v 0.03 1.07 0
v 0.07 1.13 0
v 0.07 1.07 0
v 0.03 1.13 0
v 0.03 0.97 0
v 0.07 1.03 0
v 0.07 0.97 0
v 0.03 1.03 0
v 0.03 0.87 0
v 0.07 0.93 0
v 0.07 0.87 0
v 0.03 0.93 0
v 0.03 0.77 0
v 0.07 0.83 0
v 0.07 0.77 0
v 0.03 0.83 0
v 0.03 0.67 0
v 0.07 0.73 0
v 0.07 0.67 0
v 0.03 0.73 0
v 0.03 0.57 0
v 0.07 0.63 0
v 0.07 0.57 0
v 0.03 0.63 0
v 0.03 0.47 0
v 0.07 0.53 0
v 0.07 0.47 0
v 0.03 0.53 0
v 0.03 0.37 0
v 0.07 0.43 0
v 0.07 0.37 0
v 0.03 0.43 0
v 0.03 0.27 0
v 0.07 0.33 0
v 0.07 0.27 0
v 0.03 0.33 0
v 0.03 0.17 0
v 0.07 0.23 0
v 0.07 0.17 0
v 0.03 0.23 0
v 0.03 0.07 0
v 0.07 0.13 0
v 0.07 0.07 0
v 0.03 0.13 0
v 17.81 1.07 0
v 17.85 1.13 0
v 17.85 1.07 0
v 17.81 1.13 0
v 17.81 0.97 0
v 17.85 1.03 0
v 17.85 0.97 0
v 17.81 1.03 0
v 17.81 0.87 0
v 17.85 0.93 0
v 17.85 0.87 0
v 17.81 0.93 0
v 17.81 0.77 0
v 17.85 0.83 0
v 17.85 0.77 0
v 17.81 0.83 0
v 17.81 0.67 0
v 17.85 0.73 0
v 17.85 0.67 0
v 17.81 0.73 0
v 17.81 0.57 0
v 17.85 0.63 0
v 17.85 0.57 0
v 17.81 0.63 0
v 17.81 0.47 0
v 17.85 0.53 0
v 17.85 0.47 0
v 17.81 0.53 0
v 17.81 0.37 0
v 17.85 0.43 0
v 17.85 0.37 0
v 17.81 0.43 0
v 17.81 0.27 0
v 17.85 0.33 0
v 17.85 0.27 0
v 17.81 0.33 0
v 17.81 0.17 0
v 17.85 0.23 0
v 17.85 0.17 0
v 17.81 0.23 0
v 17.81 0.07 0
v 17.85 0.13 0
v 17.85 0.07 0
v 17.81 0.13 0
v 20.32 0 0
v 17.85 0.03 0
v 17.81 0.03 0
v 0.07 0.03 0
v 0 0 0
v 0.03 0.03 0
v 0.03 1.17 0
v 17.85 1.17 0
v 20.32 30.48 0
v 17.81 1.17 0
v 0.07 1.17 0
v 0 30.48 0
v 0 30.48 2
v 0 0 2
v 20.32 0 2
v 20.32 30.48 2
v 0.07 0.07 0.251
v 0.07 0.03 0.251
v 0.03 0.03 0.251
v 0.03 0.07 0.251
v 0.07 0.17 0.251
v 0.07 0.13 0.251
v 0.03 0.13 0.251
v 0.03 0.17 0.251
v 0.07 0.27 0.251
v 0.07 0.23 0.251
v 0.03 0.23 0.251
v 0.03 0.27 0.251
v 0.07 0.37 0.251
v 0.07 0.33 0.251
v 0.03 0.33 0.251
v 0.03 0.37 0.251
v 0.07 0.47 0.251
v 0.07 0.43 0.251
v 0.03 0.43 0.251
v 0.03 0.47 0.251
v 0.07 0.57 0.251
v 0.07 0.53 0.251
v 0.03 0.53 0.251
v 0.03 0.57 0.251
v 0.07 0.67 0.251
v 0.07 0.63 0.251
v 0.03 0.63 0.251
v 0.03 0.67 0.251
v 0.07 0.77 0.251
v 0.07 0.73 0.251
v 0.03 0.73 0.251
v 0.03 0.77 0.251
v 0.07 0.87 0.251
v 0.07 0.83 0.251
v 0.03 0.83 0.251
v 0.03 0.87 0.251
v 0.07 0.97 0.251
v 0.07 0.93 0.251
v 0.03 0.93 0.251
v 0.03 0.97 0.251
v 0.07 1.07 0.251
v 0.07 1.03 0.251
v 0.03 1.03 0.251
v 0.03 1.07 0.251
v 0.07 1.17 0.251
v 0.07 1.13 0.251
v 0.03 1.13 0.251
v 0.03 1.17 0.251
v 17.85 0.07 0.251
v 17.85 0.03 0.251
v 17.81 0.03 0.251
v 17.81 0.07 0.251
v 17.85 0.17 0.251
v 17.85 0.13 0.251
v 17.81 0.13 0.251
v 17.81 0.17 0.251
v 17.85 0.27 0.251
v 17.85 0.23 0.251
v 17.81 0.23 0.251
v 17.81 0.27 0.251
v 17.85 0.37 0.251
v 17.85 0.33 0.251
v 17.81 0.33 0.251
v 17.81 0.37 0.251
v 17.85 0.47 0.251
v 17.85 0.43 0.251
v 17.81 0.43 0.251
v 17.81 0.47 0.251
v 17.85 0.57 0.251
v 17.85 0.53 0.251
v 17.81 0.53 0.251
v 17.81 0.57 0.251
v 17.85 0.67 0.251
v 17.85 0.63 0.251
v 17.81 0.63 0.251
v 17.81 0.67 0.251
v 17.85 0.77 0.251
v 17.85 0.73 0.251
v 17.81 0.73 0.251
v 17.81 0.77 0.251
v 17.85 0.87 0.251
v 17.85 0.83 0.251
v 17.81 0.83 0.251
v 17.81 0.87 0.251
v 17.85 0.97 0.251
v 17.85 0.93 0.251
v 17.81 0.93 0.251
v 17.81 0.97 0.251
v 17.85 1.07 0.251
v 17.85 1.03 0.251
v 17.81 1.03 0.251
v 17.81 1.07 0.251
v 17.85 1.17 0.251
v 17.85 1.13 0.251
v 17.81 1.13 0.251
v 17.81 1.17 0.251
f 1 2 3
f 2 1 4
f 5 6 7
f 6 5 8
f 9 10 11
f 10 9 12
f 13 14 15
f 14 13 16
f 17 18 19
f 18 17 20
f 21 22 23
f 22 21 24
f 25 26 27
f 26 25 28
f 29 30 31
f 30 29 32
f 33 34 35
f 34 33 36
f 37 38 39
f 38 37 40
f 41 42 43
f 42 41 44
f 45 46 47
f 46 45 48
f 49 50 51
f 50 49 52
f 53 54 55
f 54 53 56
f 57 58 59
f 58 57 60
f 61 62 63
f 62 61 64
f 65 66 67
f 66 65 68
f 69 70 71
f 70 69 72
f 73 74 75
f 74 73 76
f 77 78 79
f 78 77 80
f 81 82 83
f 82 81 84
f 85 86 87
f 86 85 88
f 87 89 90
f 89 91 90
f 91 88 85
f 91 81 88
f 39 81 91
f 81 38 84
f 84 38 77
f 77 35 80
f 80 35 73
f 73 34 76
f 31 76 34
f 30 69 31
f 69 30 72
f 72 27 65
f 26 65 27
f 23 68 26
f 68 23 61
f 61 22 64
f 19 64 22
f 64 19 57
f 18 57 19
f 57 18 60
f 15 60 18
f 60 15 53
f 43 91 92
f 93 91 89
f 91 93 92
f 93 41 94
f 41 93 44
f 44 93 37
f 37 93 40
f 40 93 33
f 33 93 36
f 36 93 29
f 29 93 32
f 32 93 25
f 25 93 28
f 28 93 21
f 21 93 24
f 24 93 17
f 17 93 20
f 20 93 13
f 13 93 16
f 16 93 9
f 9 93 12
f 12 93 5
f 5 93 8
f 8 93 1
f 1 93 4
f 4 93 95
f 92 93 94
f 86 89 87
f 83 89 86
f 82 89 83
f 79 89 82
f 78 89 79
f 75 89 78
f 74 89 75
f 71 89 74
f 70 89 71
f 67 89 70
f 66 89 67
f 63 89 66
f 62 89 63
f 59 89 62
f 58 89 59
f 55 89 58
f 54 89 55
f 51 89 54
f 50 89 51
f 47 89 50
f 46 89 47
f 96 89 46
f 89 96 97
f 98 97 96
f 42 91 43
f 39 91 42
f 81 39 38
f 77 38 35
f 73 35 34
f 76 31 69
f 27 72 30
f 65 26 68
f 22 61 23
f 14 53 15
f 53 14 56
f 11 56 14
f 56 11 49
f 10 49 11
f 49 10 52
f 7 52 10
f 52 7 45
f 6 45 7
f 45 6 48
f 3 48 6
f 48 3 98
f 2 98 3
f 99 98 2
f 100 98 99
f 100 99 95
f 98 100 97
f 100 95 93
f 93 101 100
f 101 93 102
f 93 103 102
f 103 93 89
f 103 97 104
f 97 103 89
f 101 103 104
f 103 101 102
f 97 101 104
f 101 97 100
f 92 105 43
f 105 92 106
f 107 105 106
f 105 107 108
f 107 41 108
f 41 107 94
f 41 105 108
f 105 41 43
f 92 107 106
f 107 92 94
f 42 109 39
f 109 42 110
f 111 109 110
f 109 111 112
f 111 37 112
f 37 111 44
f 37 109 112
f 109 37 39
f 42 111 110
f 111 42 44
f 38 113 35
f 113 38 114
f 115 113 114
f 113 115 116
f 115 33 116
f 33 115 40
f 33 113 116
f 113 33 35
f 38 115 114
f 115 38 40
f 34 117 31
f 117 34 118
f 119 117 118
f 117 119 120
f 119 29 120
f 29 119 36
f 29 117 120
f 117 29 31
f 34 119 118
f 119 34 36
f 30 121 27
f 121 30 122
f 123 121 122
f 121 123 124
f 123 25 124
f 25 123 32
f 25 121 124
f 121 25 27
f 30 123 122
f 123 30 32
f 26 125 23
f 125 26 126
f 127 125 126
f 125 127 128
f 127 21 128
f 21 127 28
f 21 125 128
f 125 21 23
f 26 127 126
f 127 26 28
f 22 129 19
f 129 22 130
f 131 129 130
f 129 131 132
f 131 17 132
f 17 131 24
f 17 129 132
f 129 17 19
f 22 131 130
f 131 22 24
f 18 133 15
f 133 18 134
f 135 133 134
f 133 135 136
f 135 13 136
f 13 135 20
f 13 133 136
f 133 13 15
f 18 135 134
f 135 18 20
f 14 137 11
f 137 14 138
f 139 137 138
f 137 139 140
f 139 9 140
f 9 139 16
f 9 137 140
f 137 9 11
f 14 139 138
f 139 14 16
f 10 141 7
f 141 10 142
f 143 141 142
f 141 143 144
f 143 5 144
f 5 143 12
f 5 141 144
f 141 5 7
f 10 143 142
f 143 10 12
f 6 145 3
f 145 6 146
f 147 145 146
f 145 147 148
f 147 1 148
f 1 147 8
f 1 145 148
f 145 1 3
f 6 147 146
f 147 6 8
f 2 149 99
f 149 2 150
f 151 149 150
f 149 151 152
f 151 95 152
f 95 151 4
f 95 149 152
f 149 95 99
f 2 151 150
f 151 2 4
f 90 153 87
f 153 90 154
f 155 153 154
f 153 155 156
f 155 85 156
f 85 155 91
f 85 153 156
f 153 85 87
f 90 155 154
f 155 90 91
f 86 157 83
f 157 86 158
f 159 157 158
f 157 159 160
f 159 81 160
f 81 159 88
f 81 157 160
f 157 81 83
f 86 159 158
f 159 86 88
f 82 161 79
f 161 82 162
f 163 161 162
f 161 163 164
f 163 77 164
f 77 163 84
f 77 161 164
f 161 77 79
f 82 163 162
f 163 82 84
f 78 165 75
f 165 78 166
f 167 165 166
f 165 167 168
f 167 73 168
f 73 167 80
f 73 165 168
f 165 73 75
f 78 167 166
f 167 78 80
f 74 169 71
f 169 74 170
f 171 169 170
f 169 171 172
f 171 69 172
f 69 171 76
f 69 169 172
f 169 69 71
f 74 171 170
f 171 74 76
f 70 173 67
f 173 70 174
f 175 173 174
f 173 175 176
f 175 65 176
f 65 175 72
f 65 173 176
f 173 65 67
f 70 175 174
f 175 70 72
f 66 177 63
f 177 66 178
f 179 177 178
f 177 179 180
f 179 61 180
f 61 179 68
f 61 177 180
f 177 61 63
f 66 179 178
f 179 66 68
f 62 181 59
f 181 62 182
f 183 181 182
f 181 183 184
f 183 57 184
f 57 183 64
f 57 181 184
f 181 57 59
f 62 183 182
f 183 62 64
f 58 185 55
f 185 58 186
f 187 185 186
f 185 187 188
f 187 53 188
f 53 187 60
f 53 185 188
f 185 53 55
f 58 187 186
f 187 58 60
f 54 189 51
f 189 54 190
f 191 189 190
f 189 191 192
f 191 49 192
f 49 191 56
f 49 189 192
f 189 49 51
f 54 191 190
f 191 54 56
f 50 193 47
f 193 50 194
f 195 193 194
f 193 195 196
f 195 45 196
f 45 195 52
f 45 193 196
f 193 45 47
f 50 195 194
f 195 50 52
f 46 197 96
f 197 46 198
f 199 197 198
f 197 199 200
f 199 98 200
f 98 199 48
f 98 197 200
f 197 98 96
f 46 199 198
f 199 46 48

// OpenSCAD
difference(){
	union() {
		union() {
			cube(size = [0.1000000000, 1.2000000000, 0.2500000000]);
			translate(v = [0.0300000000, 0.0300000000, 0]) {
			}
			translate(v = [0.0300000000, 0.1300000000, 0]) {
			}
			translate(v = [0.0300000000, 0.2300000000, 0]) {
			}
			translate(v = [0.0300000000, 0.3300000000, 0]) {
			}
			translate(v = [0.0300000000, 0.4300000000, 0]) {
			}
			translate(v = [0.0300000000, 0.5300000000, 0]) {
			}
			translate(v = [0.0300000000, 0.6300000000, 0]) {
			}
			translate(v = [0.0300000000, 0.7300000000, 0]) {
			}
			translate(v = [0.0300000000, 0.8300000000, 0]) {
			}
			translate(v = [0.0300000000, 0.9300000000, 0]) {
			}
			translate(v = [0.0300000000, 1.0300000000, 0]) {
			}
			translate(v = [0.0300000000, 1.1300000000, 0]) {
			}
		}
		cube(size = [20.3200000000, 30.4800000000, 2]);
		translate(v = [17.7800000000, 0, 0]) {
			union() {
				cube(size = [0.1000000000, 1.2000000000, 0.2500000000]);
				translate(v = [0.0300000000, 0.0300000000, 0]) {
				}
				translate(v = [0.0300000000, 0.1300000000, 0]) {
				}
				translate(v = [0.0300000000, 0.2300000000, 0]) {
				}
				translate(v = [0.0300000000, 0.3300000000, 0]) {
				}
				translate(v = [0.0300000000, 0.4300000000, 0]) {
				}
				translate(v = [0.0300000000, 0.5300000000, 0]) {
				}
				translate(v = [0.0300000000, 0.6300000000, 0]) {
				}
				translate(v = [0.0300000000, 0.7300000000, 0]) {
				}
				translate(v = [0.0300000000, 0.8300000000, 0]) {
				}
				translate(v = [0.0300000000, 0.9300000000, 0]) {
				}
				translate(v = [0.0300000000, 1.0300000000, 0]) {
				}
				translate(v = [0.0300000000, 1.1300000000, 0]) {
				}
			}
		}
	}
	/* Holes Below*/
	union(){
		union(){
			translate(v = [0.0300000000, 0.0300000000, 0]){
				cube(size = [0.0400000000, 0.0400000000, 0.2510000000]);
			}
			translate(v = [0.0300000000, 0.1300000000, 0]){
				cube(size = [0.0400000000, 0.0400000000, 0.2510000000]);
			}
			translate(v = [0.0300000000, 0.2300000000, 0]){
				cube(size = [0.0400000000, 0.0400000000, 0.2510000000]);
			}
			translate(v = [0.0300000000, 0.3300000000, 0]){
				cube(size = [0.0400000000, 0.0400000000, 0.2510000000]);
			}
			translate(v = [0.0300000000, 0.4300000000, 0]){
				cube(size = [0.0400000000, 0.0400000000, 0.2510000000]);
			}
			translate(v = [0.0300000000, 0.5300000000, 0]){
				cube(size = [0.0400000000, 0.0400000000, 0.2510000000]);
			}
			translate(v = [0.0300000000, 0.6300000000, 0]){
				cube(size = [0.0400000000, 0.0400000000, 0.2510000000]);
			}
			translate(v = [0.0300000000, 0.7300000000, 0]){
				cube(size = [0.0400000000, 0.0400000000, 0.2510000000]);
			}
			translate(v = [0.0300000000, 0.8300000000, 0]){
				cube(size = [0.0400000000, 0.0400000000, 0.2510000000]);
			}
			translate(v = [0.0300000000, 0.9300000000, 0]){
				cube(size = [0.0400000000, 0.0400000000, 0.2510000000]);
			}
			translate(v = [0.0300000000, 1.0300000000, 0]){
				cube(size = [0.0400000000, 0.0400000000, 0.2510000000]);
			}
			translate(v = [0.0300000000, 1.1300000000, 0]){
				cube(size = [0.0400000000, 0.0400000000, 0.2510000000]);
			}
		}
		translate(v = [17.7800000000, 0, 0]){
			union(){
				translate(v = [0.0300000000, 0.0300000000, 0]){
					cube(size = [0.0400000000, 0.0400000000, 0.2510000000]);
				}
				translate(v = [0.0300000000, 0.1300000000, 0]){
					cube(size = [0.0400000000, 0.0400000000, 0.2510000000]);
				}
				translate(v = [0.0300000000, 0.2300000000, 0]){
					cube(size = [0.0400000000, 0.0400000000, 0.2510000000]);
				}
				translate(v = [0.0300000000, 0.3300000000, 0]){
					cube(size = [0.0400000000, 0.0400000000, 0.2510000000]);
				}
				translate(v = [0.0300000000, 0.4300000000, 0]){
					cube(size = [0.0400000000, 0.0400000000, 0.2510000000]);
				}
				translate(v = [0.0300000000, 0.5300000000, 0]){
					cube(size = [0.0400000000, 0.0400000000, 0.2510000000]);
				}
				translate(v = [0.0300000000, 0.6300000000, 0]){
					cube(size = [0.0400000000, 0.0400000000, 0.2510000000]);
				}
				translate(v = [0.0300000000, 0.7300000000, 0]){
					cube(size = [0.0400000000, 0.0400000000, 0.2510000000]);
				}
				translate(v = [0.0300000000, 0.8300000000, 0]){
					cube(size = [0.0400000000, 0.0400000000, 0.2510000000]);
				}
				translate(v = [0.0300000000, 0.9300000000, 0]){
					cube(size = [0.0400000000, 0.0400000000, 0.2510000000]);
				}
				translate(v = [0.0300000000, 1.0300000000, 0]){
					cube(size = [0.0400000000, 0.0400000000, 0.2510000000]);
				}
				translate(v = [0.0300000000, 1.1300000000, 0]){
					cube(size = [0.0400000000, 0.0400000000, 0.2510000000]);
				}
			}
		}
	} /* End Holes */ 
}
